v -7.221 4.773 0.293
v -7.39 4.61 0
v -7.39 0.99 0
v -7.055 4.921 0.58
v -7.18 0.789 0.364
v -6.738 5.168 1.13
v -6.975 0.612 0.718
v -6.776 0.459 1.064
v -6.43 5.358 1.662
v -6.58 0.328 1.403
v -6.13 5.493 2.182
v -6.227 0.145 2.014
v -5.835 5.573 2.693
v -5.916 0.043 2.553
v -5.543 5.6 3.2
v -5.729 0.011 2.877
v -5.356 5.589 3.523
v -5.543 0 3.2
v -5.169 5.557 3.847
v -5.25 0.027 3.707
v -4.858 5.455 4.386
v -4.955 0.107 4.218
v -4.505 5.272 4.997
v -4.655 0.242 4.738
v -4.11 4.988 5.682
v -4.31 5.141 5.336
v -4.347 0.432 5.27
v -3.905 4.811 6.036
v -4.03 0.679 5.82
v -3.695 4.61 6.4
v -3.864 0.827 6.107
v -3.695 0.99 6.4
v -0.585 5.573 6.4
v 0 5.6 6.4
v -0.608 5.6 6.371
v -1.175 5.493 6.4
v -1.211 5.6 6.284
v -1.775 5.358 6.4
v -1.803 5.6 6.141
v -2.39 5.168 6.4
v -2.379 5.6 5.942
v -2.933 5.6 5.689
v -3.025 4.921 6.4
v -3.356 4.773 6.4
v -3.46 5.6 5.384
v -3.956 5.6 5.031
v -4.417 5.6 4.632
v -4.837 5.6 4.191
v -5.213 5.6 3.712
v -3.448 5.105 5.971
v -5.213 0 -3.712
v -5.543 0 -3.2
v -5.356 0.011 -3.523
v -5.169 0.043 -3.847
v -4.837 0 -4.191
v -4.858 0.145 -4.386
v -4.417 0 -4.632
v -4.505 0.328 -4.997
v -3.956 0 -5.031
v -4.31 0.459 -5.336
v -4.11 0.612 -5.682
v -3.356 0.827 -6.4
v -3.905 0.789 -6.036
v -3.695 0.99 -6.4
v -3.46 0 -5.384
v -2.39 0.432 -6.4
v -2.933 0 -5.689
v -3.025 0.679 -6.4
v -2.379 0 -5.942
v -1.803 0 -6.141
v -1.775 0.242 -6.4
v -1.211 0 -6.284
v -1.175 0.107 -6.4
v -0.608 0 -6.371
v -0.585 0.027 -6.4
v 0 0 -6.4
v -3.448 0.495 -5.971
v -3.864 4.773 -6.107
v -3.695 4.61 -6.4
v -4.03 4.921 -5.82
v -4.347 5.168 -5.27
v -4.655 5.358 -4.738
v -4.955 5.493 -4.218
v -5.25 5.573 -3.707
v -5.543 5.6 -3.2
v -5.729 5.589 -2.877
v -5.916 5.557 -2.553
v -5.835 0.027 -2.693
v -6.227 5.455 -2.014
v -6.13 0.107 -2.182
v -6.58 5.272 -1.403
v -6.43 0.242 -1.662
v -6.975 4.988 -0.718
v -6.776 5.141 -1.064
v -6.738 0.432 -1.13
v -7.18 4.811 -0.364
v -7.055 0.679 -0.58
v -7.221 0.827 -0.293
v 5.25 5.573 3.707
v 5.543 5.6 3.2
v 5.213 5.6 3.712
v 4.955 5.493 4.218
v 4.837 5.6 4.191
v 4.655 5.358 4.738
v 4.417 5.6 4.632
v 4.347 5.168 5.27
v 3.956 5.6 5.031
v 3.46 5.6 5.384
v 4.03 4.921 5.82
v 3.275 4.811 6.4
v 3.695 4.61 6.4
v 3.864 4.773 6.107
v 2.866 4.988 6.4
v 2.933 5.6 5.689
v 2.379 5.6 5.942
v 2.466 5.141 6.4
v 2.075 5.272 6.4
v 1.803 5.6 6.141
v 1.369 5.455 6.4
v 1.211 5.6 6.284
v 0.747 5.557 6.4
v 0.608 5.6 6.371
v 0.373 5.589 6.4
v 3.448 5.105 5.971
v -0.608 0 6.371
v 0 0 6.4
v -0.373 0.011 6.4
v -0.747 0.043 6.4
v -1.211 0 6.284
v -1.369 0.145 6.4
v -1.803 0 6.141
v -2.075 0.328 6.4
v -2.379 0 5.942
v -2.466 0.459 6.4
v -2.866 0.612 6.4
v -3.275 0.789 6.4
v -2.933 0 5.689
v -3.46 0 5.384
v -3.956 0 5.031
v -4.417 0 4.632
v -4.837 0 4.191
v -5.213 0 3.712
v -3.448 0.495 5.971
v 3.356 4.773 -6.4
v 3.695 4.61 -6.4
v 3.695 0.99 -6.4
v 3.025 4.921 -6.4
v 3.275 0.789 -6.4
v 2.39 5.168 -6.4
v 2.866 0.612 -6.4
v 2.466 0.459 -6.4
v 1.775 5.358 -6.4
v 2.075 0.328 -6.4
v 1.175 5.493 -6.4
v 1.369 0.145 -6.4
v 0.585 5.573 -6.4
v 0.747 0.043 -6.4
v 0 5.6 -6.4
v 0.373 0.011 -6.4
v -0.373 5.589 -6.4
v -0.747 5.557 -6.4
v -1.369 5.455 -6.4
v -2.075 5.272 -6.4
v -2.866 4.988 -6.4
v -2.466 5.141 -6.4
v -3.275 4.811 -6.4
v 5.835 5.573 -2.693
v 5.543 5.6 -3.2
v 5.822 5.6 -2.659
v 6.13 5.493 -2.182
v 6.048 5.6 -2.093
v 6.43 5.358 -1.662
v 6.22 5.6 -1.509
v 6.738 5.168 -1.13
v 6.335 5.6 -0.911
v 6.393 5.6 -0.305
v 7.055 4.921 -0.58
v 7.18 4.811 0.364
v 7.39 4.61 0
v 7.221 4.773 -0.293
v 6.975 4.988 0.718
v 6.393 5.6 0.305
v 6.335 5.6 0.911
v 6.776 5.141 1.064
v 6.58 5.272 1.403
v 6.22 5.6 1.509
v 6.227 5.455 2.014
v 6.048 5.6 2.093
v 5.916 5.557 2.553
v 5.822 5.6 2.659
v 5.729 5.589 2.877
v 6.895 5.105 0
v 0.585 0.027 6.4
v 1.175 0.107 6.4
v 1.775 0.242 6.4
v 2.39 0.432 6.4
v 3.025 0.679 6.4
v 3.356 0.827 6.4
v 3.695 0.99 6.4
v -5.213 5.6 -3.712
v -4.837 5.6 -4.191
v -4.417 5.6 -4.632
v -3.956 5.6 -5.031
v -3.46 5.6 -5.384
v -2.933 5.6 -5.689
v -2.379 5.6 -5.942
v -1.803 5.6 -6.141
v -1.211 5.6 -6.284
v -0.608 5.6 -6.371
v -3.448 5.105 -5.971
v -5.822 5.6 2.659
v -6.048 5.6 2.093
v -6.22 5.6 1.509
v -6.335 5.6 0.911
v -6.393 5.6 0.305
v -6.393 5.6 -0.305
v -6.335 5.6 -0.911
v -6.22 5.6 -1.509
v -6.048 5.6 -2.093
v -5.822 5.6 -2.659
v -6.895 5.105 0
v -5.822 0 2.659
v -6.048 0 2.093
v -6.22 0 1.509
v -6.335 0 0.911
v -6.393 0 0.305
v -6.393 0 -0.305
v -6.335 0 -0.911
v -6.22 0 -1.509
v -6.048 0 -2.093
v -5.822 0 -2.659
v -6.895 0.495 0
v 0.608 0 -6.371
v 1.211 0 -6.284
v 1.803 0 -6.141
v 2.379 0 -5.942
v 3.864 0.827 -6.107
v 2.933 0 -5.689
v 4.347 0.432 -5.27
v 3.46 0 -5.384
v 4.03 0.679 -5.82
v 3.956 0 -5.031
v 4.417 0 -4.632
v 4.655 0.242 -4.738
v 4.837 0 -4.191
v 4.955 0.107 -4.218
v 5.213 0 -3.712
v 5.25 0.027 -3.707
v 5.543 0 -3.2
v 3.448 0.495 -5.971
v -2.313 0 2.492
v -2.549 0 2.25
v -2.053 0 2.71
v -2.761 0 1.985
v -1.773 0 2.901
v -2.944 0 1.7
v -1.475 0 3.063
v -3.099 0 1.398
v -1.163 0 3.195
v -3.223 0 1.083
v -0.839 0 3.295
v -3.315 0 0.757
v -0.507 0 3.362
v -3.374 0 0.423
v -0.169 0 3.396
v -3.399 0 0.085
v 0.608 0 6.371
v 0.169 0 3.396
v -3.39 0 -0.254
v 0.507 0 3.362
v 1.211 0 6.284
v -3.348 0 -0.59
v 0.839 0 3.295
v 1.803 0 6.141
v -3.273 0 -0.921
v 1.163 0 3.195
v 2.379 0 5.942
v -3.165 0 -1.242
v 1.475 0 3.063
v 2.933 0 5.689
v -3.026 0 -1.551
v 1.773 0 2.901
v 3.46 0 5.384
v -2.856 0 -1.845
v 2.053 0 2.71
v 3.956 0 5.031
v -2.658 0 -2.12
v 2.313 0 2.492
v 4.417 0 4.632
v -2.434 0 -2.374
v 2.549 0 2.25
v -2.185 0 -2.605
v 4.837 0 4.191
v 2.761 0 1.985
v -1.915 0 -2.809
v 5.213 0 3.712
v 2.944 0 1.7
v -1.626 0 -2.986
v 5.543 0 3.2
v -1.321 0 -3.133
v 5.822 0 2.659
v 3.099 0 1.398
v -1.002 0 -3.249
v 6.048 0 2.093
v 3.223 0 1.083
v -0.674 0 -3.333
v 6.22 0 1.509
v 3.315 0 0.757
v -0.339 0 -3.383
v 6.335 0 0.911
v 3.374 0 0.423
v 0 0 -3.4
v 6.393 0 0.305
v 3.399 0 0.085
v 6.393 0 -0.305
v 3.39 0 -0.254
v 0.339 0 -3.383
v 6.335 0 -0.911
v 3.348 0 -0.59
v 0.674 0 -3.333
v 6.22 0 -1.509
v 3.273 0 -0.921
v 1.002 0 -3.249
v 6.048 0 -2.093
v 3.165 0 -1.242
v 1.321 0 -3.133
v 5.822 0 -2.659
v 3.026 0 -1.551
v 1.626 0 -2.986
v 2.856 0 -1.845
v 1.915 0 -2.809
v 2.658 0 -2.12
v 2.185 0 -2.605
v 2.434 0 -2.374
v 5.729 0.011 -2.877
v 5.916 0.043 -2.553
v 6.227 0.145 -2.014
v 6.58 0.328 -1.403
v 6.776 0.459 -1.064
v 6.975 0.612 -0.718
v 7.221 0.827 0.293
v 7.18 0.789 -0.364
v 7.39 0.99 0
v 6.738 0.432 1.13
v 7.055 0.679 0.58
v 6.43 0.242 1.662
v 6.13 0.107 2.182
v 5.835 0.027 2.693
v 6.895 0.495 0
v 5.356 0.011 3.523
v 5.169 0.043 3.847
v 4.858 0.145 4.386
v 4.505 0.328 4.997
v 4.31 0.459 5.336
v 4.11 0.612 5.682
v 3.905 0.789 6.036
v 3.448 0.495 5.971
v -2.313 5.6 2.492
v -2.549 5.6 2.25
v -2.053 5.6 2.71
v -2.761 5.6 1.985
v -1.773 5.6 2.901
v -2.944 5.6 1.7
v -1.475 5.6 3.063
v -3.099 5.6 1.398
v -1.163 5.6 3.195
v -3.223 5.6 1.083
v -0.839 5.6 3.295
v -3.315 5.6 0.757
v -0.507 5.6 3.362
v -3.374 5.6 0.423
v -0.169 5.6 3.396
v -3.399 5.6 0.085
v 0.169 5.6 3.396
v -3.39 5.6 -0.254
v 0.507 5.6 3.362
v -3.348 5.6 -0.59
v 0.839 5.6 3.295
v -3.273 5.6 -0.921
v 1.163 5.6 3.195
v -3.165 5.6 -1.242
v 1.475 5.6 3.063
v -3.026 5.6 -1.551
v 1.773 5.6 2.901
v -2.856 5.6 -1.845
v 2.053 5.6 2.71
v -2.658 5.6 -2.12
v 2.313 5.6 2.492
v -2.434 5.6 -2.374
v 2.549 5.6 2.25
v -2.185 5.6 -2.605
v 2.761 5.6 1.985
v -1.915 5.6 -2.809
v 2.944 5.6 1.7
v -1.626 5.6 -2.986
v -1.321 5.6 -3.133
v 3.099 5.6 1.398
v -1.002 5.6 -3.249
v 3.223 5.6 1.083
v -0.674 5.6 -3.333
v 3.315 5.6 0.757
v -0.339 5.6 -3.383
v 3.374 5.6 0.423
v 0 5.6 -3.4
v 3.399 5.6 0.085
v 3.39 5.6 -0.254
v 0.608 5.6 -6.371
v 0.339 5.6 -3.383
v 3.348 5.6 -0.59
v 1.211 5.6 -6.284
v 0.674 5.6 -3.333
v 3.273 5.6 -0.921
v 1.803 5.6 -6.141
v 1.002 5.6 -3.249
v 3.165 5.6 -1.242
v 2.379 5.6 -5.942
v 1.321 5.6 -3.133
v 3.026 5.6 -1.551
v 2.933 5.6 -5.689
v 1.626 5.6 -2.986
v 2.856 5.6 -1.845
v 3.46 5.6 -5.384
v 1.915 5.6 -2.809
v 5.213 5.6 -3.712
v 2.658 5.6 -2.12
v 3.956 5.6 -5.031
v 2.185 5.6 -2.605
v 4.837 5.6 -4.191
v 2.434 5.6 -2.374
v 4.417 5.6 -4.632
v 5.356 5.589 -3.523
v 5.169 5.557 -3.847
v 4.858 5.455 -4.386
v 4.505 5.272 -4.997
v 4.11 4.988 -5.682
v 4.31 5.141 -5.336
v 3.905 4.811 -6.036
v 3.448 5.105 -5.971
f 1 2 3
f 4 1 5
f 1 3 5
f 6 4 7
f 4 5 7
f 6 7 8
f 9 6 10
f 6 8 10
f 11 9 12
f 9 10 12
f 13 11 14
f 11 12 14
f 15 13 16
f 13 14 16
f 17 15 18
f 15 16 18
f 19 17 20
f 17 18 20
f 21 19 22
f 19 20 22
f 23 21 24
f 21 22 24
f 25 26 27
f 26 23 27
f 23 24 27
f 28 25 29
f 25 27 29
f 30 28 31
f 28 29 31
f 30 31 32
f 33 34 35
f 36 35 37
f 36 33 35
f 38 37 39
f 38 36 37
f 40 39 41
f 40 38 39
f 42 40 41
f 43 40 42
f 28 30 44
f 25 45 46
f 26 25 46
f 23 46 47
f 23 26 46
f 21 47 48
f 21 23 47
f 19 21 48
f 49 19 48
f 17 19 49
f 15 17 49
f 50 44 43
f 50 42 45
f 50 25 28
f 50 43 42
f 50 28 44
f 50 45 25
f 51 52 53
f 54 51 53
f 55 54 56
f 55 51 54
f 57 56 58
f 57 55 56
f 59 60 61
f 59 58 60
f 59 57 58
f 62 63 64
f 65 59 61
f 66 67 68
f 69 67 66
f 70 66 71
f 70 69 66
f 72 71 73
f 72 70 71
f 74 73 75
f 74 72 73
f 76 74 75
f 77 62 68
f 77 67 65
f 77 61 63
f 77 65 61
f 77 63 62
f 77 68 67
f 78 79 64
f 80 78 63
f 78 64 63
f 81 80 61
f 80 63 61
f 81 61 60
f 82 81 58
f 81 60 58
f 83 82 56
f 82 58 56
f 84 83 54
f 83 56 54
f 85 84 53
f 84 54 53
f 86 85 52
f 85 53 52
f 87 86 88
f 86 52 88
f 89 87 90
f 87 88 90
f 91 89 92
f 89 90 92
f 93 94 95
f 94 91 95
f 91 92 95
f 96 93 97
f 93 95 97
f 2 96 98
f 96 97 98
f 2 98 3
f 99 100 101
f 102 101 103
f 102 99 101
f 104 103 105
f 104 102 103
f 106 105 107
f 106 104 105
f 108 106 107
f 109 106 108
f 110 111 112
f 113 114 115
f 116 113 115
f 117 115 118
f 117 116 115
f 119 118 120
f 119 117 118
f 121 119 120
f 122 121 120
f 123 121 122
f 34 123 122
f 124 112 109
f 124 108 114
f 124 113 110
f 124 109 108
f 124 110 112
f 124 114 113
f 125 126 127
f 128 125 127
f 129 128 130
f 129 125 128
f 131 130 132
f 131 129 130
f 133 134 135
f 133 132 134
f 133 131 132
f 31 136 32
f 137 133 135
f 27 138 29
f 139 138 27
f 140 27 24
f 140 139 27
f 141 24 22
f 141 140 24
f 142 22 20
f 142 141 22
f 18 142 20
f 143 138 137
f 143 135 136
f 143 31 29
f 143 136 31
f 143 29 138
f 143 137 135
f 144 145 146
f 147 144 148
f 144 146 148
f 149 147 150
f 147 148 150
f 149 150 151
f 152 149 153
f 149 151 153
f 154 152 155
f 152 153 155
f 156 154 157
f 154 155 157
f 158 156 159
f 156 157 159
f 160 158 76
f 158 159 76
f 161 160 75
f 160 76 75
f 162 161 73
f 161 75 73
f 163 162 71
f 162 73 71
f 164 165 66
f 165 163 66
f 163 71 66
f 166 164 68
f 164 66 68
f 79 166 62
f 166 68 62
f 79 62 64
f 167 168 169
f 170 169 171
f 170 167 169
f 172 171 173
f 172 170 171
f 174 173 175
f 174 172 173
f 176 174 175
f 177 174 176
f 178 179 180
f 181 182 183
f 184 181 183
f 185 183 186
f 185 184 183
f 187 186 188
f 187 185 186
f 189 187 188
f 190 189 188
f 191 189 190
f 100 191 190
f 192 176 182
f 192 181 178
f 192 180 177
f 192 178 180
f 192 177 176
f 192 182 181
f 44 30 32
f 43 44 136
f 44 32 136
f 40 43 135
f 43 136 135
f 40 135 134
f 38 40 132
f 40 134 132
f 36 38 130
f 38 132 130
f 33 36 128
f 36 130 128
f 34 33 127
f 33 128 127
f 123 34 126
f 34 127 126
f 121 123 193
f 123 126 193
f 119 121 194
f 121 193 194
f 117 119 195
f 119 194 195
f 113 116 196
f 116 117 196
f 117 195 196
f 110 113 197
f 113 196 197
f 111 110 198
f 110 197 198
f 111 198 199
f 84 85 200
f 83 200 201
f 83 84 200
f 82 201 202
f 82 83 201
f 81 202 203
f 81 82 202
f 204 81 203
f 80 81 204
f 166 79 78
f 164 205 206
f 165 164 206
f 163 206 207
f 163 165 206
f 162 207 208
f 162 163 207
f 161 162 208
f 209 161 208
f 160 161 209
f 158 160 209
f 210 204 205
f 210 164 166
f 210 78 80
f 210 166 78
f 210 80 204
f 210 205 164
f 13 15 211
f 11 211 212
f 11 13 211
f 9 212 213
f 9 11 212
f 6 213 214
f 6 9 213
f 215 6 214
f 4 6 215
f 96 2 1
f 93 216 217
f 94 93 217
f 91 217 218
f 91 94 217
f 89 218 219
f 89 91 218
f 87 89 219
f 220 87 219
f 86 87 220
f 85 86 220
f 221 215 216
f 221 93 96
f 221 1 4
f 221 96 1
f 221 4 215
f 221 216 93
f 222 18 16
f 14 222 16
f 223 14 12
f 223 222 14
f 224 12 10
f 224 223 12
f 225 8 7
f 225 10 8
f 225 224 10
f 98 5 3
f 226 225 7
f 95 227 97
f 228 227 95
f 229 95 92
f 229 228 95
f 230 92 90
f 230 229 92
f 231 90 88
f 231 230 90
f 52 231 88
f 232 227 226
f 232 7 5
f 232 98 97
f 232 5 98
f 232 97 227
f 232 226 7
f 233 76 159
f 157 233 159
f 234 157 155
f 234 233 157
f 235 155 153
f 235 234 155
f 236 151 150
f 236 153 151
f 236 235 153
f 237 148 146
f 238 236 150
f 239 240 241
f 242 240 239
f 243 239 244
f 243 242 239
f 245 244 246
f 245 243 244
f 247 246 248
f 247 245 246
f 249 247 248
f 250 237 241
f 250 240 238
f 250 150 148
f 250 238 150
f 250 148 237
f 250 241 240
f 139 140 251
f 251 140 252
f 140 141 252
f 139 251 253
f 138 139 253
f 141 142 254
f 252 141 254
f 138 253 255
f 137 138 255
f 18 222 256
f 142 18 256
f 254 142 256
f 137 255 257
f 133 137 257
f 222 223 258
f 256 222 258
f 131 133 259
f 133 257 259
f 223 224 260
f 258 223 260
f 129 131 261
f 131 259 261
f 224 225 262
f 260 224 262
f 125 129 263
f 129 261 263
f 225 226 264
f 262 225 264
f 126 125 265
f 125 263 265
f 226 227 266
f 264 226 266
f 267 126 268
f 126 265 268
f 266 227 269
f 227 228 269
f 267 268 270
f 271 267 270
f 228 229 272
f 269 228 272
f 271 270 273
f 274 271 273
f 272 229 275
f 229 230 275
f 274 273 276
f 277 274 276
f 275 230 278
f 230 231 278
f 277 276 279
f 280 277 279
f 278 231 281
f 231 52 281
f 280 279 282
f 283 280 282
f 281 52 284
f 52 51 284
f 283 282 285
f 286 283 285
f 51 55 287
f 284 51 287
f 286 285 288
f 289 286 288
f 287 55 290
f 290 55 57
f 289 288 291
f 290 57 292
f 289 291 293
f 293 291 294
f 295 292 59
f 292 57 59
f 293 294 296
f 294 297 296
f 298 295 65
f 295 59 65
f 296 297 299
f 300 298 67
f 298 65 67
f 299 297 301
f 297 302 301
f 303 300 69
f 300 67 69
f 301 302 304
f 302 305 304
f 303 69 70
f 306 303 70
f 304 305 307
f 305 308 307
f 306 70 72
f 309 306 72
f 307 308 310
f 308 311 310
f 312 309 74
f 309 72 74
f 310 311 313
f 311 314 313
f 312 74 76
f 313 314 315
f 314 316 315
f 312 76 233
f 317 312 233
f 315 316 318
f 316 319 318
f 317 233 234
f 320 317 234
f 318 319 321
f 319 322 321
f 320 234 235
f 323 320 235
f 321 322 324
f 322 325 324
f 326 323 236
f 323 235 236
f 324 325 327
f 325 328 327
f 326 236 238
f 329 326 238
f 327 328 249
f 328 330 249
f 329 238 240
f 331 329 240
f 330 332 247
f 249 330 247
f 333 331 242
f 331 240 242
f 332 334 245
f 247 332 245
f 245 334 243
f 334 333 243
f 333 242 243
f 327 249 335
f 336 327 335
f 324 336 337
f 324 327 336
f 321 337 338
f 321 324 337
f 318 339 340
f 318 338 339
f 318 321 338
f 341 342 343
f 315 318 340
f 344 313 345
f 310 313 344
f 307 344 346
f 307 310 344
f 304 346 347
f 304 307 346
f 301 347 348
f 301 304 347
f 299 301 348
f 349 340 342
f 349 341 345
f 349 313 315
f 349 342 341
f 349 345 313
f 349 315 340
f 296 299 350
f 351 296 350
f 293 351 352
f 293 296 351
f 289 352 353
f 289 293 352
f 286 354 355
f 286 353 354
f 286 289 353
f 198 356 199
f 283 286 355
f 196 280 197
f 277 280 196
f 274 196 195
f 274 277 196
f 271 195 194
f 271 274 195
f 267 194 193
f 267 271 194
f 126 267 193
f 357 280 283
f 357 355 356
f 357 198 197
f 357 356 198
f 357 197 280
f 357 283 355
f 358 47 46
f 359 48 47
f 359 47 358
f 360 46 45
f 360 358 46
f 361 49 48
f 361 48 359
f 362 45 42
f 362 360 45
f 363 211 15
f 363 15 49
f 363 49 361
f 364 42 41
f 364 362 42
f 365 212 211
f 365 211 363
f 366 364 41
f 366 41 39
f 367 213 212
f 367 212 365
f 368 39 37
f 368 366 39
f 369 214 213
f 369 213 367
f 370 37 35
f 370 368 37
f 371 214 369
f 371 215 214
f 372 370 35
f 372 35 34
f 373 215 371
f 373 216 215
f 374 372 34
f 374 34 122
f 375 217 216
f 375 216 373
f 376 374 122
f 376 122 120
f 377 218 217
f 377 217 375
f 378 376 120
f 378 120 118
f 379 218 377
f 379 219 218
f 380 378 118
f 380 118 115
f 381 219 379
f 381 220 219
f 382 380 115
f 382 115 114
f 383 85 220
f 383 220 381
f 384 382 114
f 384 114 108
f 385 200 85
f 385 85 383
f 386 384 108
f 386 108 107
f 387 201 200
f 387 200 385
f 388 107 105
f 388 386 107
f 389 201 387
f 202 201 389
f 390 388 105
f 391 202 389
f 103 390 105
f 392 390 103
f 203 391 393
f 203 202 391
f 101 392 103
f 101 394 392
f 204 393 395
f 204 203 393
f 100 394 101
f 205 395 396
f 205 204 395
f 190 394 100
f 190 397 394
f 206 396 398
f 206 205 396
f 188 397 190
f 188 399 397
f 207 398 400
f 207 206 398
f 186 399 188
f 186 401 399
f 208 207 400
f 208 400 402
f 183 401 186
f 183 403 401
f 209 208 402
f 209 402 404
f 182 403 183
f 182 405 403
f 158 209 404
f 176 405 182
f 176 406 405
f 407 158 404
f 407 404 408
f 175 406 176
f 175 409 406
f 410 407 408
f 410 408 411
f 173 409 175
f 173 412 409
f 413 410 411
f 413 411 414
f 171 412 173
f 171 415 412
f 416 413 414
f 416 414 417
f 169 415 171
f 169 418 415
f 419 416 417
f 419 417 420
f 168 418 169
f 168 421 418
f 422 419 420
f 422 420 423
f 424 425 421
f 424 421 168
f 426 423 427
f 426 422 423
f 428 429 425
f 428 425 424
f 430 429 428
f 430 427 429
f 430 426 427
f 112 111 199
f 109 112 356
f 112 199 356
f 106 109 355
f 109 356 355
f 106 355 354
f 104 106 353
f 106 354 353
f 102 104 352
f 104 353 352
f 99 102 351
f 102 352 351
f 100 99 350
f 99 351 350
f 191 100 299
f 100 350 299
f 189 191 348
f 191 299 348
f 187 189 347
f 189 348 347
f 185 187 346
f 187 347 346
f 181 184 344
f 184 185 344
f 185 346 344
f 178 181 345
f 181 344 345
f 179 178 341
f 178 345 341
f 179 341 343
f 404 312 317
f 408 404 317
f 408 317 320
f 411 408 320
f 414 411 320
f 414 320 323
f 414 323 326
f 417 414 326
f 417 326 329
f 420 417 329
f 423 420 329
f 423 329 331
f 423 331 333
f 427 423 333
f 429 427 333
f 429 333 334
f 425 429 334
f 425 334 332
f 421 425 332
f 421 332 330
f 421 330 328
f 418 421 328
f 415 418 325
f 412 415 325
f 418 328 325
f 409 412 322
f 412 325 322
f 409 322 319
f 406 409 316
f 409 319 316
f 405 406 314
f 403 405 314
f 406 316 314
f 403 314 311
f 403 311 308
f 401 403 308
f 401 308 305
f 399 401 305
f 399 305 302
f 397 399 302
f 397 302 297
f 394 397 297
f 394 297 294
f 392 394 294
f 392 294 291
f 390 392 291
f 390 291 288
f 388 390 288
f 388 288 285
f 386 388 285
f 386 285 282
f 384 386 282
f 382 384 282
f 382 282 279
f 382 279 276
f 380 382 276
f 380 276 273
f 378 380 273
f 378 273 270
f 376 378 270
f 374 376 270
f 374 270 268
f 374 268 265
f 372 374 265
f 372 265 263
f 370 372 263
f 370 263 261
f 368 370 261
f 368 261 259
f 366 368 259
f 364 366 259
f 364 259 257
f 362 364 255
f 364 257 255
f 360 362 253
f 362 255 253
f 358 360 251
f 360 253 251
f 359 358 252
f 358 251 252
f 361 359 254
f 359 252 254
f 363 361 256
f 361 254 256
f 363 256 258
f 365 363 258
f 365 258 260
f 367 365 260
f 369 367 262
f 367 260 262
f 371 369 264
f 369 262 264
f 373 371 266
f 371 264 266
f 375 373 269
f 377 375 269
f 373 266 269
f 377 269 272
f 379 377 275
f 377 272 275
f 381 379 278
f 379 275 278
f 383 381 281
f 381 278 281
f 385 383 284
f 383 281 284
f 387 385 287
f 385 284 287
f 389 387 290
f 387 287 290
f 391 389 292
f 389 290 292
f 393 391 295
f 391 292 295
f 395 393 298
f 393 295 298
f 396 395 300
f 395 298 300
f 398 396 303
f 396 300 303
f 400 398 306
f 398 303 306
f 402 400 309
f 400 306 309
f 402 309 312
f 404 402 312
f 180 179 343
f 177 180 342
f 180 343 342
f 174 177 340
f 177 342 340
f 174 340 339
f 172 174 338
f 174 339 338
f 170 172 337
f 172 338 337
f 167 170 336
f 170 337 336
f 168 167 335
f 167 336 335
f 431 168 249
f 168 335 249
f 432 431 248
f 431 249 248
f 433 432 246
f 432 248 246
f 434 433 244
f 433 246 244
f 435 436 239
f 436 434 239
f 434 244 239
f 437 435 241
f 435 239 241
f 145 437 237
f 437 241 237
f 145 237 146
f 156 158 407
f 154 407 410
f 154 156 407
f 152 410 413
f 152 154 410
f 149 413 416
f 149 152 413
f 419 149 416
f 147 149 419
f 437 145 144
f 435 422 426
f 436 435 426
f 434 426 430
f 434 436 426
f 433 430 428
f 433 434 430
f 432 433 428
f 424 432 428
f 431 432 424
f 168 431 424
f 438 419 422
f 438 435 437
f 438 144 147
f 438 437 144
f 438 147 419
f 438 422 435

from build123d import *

# Parameters (mm, degrees)
EXTRUDE1_DEPTH                   = 5.6
SKETCH3_R                        = 12.424094019
SKETCH3_R_2                      = 6.4
EXTRUDE3_DEPTH                   = 6.1
EXTRUDE3_TAPER                   = 45
SKETCH4_R                        = 12.424094019
SKETCH4_R_2                      = 6.4
EXTRUDE4_DEPTH                   = 6.1
EXTRUDE4_DRAFT                   = -45
TAP_DRILL_FOR_M8X1_25_TAP1_D     = 6.8
TAP_DRILL_FOR_M8X1_25_TAP1_DEPTH = 10
TAP_DRILL_FOR_M8X1_25_TAP1_TIP   = 2.042926105


with BuildPart() as part:
    # Sketch1 → Extrude1 (new body)
    with BuildSketch(Plane(origin=(0, 0, 0), x_dir=(1, 0, 0), z_dir=(0, 1, 0))):
        Polygon((7.390083446, 0), (3.695041723, 6.4), (-3.695041723, 6.4), (-7.390083446, 0), (-3.695041723, -6.4), (3.695041723, -6.4), align=None)
    extrude(amount=EXTRUDE1_DEPTH)

    # Sketch3 → Extrude3 (cut)
    with BuildSketch(Plane(origin=(0, 5.6, 0), x_dir=(1, 0, 0), z_dir=(0, 1, 0))):
        Circle(SKETCH3_R)
        Circle(SKETCH3_R_2, mode=Mode.SUBTRACT)
    extrude(amount=-EXTRUDE3_DEPTH, taper=EXTRUDE3_TAPER, mode=Mode.SUBTRACT)


with BuildPart() as extrude4_tool:
    # Sketch4 → Extrude4 (with draft: the straight prism first)
    with BuildSketch(Plane.XZ):
        Circle(SKETCH4_R)
        Circle(SKETCH4_R_2, mode=Mode.SUBTRACT)
    extrude(amount=-EXTRUDE4_DEPTH)
    # Extrude4: the draft: its side faces are tilted about the plane it starts from
    extrude4_sides = [extrude4_tool.faces().sort_by_distance(p)[0] for p in [
        (-12.424094019, 3.05, 0),
        (-6.4, 3.05, 0),
    ]]
    draft(extrude4_sides, Plane.XZ, EXTRUDE4_DRAFT)


with BuildPart() as part_1:
    add(part.part)

    # Extrude4: cut by extrude4_tool
    add(extrude4_tool.part, mode=Mode.SUBTRACT)

    # Tap Drill for M8x1.25 Tap1
    with Locations(Plane.ZX.offset(5.6)):
        with Locations((0, 0)):
            Hole(TAP_DRILL_FOR_M8X1_25_TAP1_D / 2, depth=TAP_DRILL_FOR_M8X1_25_TAP1_DEPTH)
            with Locations((0, 0, -(TAP_DRILL_FOR_M8X1_25_TAP1_DEPTH + TAP_DRILL_FOR_M8X1_25_TAP1_TIP / 2))):  # 118° drill point
                Cone(0, TAP_DRILL_FOR_M8X1_25_TAP1_D / 2, TAP_DRILL_FOR_M8X1_25_TAP1_TIP, mode=Mode.SUBTRACT)


solid = part_1.part
